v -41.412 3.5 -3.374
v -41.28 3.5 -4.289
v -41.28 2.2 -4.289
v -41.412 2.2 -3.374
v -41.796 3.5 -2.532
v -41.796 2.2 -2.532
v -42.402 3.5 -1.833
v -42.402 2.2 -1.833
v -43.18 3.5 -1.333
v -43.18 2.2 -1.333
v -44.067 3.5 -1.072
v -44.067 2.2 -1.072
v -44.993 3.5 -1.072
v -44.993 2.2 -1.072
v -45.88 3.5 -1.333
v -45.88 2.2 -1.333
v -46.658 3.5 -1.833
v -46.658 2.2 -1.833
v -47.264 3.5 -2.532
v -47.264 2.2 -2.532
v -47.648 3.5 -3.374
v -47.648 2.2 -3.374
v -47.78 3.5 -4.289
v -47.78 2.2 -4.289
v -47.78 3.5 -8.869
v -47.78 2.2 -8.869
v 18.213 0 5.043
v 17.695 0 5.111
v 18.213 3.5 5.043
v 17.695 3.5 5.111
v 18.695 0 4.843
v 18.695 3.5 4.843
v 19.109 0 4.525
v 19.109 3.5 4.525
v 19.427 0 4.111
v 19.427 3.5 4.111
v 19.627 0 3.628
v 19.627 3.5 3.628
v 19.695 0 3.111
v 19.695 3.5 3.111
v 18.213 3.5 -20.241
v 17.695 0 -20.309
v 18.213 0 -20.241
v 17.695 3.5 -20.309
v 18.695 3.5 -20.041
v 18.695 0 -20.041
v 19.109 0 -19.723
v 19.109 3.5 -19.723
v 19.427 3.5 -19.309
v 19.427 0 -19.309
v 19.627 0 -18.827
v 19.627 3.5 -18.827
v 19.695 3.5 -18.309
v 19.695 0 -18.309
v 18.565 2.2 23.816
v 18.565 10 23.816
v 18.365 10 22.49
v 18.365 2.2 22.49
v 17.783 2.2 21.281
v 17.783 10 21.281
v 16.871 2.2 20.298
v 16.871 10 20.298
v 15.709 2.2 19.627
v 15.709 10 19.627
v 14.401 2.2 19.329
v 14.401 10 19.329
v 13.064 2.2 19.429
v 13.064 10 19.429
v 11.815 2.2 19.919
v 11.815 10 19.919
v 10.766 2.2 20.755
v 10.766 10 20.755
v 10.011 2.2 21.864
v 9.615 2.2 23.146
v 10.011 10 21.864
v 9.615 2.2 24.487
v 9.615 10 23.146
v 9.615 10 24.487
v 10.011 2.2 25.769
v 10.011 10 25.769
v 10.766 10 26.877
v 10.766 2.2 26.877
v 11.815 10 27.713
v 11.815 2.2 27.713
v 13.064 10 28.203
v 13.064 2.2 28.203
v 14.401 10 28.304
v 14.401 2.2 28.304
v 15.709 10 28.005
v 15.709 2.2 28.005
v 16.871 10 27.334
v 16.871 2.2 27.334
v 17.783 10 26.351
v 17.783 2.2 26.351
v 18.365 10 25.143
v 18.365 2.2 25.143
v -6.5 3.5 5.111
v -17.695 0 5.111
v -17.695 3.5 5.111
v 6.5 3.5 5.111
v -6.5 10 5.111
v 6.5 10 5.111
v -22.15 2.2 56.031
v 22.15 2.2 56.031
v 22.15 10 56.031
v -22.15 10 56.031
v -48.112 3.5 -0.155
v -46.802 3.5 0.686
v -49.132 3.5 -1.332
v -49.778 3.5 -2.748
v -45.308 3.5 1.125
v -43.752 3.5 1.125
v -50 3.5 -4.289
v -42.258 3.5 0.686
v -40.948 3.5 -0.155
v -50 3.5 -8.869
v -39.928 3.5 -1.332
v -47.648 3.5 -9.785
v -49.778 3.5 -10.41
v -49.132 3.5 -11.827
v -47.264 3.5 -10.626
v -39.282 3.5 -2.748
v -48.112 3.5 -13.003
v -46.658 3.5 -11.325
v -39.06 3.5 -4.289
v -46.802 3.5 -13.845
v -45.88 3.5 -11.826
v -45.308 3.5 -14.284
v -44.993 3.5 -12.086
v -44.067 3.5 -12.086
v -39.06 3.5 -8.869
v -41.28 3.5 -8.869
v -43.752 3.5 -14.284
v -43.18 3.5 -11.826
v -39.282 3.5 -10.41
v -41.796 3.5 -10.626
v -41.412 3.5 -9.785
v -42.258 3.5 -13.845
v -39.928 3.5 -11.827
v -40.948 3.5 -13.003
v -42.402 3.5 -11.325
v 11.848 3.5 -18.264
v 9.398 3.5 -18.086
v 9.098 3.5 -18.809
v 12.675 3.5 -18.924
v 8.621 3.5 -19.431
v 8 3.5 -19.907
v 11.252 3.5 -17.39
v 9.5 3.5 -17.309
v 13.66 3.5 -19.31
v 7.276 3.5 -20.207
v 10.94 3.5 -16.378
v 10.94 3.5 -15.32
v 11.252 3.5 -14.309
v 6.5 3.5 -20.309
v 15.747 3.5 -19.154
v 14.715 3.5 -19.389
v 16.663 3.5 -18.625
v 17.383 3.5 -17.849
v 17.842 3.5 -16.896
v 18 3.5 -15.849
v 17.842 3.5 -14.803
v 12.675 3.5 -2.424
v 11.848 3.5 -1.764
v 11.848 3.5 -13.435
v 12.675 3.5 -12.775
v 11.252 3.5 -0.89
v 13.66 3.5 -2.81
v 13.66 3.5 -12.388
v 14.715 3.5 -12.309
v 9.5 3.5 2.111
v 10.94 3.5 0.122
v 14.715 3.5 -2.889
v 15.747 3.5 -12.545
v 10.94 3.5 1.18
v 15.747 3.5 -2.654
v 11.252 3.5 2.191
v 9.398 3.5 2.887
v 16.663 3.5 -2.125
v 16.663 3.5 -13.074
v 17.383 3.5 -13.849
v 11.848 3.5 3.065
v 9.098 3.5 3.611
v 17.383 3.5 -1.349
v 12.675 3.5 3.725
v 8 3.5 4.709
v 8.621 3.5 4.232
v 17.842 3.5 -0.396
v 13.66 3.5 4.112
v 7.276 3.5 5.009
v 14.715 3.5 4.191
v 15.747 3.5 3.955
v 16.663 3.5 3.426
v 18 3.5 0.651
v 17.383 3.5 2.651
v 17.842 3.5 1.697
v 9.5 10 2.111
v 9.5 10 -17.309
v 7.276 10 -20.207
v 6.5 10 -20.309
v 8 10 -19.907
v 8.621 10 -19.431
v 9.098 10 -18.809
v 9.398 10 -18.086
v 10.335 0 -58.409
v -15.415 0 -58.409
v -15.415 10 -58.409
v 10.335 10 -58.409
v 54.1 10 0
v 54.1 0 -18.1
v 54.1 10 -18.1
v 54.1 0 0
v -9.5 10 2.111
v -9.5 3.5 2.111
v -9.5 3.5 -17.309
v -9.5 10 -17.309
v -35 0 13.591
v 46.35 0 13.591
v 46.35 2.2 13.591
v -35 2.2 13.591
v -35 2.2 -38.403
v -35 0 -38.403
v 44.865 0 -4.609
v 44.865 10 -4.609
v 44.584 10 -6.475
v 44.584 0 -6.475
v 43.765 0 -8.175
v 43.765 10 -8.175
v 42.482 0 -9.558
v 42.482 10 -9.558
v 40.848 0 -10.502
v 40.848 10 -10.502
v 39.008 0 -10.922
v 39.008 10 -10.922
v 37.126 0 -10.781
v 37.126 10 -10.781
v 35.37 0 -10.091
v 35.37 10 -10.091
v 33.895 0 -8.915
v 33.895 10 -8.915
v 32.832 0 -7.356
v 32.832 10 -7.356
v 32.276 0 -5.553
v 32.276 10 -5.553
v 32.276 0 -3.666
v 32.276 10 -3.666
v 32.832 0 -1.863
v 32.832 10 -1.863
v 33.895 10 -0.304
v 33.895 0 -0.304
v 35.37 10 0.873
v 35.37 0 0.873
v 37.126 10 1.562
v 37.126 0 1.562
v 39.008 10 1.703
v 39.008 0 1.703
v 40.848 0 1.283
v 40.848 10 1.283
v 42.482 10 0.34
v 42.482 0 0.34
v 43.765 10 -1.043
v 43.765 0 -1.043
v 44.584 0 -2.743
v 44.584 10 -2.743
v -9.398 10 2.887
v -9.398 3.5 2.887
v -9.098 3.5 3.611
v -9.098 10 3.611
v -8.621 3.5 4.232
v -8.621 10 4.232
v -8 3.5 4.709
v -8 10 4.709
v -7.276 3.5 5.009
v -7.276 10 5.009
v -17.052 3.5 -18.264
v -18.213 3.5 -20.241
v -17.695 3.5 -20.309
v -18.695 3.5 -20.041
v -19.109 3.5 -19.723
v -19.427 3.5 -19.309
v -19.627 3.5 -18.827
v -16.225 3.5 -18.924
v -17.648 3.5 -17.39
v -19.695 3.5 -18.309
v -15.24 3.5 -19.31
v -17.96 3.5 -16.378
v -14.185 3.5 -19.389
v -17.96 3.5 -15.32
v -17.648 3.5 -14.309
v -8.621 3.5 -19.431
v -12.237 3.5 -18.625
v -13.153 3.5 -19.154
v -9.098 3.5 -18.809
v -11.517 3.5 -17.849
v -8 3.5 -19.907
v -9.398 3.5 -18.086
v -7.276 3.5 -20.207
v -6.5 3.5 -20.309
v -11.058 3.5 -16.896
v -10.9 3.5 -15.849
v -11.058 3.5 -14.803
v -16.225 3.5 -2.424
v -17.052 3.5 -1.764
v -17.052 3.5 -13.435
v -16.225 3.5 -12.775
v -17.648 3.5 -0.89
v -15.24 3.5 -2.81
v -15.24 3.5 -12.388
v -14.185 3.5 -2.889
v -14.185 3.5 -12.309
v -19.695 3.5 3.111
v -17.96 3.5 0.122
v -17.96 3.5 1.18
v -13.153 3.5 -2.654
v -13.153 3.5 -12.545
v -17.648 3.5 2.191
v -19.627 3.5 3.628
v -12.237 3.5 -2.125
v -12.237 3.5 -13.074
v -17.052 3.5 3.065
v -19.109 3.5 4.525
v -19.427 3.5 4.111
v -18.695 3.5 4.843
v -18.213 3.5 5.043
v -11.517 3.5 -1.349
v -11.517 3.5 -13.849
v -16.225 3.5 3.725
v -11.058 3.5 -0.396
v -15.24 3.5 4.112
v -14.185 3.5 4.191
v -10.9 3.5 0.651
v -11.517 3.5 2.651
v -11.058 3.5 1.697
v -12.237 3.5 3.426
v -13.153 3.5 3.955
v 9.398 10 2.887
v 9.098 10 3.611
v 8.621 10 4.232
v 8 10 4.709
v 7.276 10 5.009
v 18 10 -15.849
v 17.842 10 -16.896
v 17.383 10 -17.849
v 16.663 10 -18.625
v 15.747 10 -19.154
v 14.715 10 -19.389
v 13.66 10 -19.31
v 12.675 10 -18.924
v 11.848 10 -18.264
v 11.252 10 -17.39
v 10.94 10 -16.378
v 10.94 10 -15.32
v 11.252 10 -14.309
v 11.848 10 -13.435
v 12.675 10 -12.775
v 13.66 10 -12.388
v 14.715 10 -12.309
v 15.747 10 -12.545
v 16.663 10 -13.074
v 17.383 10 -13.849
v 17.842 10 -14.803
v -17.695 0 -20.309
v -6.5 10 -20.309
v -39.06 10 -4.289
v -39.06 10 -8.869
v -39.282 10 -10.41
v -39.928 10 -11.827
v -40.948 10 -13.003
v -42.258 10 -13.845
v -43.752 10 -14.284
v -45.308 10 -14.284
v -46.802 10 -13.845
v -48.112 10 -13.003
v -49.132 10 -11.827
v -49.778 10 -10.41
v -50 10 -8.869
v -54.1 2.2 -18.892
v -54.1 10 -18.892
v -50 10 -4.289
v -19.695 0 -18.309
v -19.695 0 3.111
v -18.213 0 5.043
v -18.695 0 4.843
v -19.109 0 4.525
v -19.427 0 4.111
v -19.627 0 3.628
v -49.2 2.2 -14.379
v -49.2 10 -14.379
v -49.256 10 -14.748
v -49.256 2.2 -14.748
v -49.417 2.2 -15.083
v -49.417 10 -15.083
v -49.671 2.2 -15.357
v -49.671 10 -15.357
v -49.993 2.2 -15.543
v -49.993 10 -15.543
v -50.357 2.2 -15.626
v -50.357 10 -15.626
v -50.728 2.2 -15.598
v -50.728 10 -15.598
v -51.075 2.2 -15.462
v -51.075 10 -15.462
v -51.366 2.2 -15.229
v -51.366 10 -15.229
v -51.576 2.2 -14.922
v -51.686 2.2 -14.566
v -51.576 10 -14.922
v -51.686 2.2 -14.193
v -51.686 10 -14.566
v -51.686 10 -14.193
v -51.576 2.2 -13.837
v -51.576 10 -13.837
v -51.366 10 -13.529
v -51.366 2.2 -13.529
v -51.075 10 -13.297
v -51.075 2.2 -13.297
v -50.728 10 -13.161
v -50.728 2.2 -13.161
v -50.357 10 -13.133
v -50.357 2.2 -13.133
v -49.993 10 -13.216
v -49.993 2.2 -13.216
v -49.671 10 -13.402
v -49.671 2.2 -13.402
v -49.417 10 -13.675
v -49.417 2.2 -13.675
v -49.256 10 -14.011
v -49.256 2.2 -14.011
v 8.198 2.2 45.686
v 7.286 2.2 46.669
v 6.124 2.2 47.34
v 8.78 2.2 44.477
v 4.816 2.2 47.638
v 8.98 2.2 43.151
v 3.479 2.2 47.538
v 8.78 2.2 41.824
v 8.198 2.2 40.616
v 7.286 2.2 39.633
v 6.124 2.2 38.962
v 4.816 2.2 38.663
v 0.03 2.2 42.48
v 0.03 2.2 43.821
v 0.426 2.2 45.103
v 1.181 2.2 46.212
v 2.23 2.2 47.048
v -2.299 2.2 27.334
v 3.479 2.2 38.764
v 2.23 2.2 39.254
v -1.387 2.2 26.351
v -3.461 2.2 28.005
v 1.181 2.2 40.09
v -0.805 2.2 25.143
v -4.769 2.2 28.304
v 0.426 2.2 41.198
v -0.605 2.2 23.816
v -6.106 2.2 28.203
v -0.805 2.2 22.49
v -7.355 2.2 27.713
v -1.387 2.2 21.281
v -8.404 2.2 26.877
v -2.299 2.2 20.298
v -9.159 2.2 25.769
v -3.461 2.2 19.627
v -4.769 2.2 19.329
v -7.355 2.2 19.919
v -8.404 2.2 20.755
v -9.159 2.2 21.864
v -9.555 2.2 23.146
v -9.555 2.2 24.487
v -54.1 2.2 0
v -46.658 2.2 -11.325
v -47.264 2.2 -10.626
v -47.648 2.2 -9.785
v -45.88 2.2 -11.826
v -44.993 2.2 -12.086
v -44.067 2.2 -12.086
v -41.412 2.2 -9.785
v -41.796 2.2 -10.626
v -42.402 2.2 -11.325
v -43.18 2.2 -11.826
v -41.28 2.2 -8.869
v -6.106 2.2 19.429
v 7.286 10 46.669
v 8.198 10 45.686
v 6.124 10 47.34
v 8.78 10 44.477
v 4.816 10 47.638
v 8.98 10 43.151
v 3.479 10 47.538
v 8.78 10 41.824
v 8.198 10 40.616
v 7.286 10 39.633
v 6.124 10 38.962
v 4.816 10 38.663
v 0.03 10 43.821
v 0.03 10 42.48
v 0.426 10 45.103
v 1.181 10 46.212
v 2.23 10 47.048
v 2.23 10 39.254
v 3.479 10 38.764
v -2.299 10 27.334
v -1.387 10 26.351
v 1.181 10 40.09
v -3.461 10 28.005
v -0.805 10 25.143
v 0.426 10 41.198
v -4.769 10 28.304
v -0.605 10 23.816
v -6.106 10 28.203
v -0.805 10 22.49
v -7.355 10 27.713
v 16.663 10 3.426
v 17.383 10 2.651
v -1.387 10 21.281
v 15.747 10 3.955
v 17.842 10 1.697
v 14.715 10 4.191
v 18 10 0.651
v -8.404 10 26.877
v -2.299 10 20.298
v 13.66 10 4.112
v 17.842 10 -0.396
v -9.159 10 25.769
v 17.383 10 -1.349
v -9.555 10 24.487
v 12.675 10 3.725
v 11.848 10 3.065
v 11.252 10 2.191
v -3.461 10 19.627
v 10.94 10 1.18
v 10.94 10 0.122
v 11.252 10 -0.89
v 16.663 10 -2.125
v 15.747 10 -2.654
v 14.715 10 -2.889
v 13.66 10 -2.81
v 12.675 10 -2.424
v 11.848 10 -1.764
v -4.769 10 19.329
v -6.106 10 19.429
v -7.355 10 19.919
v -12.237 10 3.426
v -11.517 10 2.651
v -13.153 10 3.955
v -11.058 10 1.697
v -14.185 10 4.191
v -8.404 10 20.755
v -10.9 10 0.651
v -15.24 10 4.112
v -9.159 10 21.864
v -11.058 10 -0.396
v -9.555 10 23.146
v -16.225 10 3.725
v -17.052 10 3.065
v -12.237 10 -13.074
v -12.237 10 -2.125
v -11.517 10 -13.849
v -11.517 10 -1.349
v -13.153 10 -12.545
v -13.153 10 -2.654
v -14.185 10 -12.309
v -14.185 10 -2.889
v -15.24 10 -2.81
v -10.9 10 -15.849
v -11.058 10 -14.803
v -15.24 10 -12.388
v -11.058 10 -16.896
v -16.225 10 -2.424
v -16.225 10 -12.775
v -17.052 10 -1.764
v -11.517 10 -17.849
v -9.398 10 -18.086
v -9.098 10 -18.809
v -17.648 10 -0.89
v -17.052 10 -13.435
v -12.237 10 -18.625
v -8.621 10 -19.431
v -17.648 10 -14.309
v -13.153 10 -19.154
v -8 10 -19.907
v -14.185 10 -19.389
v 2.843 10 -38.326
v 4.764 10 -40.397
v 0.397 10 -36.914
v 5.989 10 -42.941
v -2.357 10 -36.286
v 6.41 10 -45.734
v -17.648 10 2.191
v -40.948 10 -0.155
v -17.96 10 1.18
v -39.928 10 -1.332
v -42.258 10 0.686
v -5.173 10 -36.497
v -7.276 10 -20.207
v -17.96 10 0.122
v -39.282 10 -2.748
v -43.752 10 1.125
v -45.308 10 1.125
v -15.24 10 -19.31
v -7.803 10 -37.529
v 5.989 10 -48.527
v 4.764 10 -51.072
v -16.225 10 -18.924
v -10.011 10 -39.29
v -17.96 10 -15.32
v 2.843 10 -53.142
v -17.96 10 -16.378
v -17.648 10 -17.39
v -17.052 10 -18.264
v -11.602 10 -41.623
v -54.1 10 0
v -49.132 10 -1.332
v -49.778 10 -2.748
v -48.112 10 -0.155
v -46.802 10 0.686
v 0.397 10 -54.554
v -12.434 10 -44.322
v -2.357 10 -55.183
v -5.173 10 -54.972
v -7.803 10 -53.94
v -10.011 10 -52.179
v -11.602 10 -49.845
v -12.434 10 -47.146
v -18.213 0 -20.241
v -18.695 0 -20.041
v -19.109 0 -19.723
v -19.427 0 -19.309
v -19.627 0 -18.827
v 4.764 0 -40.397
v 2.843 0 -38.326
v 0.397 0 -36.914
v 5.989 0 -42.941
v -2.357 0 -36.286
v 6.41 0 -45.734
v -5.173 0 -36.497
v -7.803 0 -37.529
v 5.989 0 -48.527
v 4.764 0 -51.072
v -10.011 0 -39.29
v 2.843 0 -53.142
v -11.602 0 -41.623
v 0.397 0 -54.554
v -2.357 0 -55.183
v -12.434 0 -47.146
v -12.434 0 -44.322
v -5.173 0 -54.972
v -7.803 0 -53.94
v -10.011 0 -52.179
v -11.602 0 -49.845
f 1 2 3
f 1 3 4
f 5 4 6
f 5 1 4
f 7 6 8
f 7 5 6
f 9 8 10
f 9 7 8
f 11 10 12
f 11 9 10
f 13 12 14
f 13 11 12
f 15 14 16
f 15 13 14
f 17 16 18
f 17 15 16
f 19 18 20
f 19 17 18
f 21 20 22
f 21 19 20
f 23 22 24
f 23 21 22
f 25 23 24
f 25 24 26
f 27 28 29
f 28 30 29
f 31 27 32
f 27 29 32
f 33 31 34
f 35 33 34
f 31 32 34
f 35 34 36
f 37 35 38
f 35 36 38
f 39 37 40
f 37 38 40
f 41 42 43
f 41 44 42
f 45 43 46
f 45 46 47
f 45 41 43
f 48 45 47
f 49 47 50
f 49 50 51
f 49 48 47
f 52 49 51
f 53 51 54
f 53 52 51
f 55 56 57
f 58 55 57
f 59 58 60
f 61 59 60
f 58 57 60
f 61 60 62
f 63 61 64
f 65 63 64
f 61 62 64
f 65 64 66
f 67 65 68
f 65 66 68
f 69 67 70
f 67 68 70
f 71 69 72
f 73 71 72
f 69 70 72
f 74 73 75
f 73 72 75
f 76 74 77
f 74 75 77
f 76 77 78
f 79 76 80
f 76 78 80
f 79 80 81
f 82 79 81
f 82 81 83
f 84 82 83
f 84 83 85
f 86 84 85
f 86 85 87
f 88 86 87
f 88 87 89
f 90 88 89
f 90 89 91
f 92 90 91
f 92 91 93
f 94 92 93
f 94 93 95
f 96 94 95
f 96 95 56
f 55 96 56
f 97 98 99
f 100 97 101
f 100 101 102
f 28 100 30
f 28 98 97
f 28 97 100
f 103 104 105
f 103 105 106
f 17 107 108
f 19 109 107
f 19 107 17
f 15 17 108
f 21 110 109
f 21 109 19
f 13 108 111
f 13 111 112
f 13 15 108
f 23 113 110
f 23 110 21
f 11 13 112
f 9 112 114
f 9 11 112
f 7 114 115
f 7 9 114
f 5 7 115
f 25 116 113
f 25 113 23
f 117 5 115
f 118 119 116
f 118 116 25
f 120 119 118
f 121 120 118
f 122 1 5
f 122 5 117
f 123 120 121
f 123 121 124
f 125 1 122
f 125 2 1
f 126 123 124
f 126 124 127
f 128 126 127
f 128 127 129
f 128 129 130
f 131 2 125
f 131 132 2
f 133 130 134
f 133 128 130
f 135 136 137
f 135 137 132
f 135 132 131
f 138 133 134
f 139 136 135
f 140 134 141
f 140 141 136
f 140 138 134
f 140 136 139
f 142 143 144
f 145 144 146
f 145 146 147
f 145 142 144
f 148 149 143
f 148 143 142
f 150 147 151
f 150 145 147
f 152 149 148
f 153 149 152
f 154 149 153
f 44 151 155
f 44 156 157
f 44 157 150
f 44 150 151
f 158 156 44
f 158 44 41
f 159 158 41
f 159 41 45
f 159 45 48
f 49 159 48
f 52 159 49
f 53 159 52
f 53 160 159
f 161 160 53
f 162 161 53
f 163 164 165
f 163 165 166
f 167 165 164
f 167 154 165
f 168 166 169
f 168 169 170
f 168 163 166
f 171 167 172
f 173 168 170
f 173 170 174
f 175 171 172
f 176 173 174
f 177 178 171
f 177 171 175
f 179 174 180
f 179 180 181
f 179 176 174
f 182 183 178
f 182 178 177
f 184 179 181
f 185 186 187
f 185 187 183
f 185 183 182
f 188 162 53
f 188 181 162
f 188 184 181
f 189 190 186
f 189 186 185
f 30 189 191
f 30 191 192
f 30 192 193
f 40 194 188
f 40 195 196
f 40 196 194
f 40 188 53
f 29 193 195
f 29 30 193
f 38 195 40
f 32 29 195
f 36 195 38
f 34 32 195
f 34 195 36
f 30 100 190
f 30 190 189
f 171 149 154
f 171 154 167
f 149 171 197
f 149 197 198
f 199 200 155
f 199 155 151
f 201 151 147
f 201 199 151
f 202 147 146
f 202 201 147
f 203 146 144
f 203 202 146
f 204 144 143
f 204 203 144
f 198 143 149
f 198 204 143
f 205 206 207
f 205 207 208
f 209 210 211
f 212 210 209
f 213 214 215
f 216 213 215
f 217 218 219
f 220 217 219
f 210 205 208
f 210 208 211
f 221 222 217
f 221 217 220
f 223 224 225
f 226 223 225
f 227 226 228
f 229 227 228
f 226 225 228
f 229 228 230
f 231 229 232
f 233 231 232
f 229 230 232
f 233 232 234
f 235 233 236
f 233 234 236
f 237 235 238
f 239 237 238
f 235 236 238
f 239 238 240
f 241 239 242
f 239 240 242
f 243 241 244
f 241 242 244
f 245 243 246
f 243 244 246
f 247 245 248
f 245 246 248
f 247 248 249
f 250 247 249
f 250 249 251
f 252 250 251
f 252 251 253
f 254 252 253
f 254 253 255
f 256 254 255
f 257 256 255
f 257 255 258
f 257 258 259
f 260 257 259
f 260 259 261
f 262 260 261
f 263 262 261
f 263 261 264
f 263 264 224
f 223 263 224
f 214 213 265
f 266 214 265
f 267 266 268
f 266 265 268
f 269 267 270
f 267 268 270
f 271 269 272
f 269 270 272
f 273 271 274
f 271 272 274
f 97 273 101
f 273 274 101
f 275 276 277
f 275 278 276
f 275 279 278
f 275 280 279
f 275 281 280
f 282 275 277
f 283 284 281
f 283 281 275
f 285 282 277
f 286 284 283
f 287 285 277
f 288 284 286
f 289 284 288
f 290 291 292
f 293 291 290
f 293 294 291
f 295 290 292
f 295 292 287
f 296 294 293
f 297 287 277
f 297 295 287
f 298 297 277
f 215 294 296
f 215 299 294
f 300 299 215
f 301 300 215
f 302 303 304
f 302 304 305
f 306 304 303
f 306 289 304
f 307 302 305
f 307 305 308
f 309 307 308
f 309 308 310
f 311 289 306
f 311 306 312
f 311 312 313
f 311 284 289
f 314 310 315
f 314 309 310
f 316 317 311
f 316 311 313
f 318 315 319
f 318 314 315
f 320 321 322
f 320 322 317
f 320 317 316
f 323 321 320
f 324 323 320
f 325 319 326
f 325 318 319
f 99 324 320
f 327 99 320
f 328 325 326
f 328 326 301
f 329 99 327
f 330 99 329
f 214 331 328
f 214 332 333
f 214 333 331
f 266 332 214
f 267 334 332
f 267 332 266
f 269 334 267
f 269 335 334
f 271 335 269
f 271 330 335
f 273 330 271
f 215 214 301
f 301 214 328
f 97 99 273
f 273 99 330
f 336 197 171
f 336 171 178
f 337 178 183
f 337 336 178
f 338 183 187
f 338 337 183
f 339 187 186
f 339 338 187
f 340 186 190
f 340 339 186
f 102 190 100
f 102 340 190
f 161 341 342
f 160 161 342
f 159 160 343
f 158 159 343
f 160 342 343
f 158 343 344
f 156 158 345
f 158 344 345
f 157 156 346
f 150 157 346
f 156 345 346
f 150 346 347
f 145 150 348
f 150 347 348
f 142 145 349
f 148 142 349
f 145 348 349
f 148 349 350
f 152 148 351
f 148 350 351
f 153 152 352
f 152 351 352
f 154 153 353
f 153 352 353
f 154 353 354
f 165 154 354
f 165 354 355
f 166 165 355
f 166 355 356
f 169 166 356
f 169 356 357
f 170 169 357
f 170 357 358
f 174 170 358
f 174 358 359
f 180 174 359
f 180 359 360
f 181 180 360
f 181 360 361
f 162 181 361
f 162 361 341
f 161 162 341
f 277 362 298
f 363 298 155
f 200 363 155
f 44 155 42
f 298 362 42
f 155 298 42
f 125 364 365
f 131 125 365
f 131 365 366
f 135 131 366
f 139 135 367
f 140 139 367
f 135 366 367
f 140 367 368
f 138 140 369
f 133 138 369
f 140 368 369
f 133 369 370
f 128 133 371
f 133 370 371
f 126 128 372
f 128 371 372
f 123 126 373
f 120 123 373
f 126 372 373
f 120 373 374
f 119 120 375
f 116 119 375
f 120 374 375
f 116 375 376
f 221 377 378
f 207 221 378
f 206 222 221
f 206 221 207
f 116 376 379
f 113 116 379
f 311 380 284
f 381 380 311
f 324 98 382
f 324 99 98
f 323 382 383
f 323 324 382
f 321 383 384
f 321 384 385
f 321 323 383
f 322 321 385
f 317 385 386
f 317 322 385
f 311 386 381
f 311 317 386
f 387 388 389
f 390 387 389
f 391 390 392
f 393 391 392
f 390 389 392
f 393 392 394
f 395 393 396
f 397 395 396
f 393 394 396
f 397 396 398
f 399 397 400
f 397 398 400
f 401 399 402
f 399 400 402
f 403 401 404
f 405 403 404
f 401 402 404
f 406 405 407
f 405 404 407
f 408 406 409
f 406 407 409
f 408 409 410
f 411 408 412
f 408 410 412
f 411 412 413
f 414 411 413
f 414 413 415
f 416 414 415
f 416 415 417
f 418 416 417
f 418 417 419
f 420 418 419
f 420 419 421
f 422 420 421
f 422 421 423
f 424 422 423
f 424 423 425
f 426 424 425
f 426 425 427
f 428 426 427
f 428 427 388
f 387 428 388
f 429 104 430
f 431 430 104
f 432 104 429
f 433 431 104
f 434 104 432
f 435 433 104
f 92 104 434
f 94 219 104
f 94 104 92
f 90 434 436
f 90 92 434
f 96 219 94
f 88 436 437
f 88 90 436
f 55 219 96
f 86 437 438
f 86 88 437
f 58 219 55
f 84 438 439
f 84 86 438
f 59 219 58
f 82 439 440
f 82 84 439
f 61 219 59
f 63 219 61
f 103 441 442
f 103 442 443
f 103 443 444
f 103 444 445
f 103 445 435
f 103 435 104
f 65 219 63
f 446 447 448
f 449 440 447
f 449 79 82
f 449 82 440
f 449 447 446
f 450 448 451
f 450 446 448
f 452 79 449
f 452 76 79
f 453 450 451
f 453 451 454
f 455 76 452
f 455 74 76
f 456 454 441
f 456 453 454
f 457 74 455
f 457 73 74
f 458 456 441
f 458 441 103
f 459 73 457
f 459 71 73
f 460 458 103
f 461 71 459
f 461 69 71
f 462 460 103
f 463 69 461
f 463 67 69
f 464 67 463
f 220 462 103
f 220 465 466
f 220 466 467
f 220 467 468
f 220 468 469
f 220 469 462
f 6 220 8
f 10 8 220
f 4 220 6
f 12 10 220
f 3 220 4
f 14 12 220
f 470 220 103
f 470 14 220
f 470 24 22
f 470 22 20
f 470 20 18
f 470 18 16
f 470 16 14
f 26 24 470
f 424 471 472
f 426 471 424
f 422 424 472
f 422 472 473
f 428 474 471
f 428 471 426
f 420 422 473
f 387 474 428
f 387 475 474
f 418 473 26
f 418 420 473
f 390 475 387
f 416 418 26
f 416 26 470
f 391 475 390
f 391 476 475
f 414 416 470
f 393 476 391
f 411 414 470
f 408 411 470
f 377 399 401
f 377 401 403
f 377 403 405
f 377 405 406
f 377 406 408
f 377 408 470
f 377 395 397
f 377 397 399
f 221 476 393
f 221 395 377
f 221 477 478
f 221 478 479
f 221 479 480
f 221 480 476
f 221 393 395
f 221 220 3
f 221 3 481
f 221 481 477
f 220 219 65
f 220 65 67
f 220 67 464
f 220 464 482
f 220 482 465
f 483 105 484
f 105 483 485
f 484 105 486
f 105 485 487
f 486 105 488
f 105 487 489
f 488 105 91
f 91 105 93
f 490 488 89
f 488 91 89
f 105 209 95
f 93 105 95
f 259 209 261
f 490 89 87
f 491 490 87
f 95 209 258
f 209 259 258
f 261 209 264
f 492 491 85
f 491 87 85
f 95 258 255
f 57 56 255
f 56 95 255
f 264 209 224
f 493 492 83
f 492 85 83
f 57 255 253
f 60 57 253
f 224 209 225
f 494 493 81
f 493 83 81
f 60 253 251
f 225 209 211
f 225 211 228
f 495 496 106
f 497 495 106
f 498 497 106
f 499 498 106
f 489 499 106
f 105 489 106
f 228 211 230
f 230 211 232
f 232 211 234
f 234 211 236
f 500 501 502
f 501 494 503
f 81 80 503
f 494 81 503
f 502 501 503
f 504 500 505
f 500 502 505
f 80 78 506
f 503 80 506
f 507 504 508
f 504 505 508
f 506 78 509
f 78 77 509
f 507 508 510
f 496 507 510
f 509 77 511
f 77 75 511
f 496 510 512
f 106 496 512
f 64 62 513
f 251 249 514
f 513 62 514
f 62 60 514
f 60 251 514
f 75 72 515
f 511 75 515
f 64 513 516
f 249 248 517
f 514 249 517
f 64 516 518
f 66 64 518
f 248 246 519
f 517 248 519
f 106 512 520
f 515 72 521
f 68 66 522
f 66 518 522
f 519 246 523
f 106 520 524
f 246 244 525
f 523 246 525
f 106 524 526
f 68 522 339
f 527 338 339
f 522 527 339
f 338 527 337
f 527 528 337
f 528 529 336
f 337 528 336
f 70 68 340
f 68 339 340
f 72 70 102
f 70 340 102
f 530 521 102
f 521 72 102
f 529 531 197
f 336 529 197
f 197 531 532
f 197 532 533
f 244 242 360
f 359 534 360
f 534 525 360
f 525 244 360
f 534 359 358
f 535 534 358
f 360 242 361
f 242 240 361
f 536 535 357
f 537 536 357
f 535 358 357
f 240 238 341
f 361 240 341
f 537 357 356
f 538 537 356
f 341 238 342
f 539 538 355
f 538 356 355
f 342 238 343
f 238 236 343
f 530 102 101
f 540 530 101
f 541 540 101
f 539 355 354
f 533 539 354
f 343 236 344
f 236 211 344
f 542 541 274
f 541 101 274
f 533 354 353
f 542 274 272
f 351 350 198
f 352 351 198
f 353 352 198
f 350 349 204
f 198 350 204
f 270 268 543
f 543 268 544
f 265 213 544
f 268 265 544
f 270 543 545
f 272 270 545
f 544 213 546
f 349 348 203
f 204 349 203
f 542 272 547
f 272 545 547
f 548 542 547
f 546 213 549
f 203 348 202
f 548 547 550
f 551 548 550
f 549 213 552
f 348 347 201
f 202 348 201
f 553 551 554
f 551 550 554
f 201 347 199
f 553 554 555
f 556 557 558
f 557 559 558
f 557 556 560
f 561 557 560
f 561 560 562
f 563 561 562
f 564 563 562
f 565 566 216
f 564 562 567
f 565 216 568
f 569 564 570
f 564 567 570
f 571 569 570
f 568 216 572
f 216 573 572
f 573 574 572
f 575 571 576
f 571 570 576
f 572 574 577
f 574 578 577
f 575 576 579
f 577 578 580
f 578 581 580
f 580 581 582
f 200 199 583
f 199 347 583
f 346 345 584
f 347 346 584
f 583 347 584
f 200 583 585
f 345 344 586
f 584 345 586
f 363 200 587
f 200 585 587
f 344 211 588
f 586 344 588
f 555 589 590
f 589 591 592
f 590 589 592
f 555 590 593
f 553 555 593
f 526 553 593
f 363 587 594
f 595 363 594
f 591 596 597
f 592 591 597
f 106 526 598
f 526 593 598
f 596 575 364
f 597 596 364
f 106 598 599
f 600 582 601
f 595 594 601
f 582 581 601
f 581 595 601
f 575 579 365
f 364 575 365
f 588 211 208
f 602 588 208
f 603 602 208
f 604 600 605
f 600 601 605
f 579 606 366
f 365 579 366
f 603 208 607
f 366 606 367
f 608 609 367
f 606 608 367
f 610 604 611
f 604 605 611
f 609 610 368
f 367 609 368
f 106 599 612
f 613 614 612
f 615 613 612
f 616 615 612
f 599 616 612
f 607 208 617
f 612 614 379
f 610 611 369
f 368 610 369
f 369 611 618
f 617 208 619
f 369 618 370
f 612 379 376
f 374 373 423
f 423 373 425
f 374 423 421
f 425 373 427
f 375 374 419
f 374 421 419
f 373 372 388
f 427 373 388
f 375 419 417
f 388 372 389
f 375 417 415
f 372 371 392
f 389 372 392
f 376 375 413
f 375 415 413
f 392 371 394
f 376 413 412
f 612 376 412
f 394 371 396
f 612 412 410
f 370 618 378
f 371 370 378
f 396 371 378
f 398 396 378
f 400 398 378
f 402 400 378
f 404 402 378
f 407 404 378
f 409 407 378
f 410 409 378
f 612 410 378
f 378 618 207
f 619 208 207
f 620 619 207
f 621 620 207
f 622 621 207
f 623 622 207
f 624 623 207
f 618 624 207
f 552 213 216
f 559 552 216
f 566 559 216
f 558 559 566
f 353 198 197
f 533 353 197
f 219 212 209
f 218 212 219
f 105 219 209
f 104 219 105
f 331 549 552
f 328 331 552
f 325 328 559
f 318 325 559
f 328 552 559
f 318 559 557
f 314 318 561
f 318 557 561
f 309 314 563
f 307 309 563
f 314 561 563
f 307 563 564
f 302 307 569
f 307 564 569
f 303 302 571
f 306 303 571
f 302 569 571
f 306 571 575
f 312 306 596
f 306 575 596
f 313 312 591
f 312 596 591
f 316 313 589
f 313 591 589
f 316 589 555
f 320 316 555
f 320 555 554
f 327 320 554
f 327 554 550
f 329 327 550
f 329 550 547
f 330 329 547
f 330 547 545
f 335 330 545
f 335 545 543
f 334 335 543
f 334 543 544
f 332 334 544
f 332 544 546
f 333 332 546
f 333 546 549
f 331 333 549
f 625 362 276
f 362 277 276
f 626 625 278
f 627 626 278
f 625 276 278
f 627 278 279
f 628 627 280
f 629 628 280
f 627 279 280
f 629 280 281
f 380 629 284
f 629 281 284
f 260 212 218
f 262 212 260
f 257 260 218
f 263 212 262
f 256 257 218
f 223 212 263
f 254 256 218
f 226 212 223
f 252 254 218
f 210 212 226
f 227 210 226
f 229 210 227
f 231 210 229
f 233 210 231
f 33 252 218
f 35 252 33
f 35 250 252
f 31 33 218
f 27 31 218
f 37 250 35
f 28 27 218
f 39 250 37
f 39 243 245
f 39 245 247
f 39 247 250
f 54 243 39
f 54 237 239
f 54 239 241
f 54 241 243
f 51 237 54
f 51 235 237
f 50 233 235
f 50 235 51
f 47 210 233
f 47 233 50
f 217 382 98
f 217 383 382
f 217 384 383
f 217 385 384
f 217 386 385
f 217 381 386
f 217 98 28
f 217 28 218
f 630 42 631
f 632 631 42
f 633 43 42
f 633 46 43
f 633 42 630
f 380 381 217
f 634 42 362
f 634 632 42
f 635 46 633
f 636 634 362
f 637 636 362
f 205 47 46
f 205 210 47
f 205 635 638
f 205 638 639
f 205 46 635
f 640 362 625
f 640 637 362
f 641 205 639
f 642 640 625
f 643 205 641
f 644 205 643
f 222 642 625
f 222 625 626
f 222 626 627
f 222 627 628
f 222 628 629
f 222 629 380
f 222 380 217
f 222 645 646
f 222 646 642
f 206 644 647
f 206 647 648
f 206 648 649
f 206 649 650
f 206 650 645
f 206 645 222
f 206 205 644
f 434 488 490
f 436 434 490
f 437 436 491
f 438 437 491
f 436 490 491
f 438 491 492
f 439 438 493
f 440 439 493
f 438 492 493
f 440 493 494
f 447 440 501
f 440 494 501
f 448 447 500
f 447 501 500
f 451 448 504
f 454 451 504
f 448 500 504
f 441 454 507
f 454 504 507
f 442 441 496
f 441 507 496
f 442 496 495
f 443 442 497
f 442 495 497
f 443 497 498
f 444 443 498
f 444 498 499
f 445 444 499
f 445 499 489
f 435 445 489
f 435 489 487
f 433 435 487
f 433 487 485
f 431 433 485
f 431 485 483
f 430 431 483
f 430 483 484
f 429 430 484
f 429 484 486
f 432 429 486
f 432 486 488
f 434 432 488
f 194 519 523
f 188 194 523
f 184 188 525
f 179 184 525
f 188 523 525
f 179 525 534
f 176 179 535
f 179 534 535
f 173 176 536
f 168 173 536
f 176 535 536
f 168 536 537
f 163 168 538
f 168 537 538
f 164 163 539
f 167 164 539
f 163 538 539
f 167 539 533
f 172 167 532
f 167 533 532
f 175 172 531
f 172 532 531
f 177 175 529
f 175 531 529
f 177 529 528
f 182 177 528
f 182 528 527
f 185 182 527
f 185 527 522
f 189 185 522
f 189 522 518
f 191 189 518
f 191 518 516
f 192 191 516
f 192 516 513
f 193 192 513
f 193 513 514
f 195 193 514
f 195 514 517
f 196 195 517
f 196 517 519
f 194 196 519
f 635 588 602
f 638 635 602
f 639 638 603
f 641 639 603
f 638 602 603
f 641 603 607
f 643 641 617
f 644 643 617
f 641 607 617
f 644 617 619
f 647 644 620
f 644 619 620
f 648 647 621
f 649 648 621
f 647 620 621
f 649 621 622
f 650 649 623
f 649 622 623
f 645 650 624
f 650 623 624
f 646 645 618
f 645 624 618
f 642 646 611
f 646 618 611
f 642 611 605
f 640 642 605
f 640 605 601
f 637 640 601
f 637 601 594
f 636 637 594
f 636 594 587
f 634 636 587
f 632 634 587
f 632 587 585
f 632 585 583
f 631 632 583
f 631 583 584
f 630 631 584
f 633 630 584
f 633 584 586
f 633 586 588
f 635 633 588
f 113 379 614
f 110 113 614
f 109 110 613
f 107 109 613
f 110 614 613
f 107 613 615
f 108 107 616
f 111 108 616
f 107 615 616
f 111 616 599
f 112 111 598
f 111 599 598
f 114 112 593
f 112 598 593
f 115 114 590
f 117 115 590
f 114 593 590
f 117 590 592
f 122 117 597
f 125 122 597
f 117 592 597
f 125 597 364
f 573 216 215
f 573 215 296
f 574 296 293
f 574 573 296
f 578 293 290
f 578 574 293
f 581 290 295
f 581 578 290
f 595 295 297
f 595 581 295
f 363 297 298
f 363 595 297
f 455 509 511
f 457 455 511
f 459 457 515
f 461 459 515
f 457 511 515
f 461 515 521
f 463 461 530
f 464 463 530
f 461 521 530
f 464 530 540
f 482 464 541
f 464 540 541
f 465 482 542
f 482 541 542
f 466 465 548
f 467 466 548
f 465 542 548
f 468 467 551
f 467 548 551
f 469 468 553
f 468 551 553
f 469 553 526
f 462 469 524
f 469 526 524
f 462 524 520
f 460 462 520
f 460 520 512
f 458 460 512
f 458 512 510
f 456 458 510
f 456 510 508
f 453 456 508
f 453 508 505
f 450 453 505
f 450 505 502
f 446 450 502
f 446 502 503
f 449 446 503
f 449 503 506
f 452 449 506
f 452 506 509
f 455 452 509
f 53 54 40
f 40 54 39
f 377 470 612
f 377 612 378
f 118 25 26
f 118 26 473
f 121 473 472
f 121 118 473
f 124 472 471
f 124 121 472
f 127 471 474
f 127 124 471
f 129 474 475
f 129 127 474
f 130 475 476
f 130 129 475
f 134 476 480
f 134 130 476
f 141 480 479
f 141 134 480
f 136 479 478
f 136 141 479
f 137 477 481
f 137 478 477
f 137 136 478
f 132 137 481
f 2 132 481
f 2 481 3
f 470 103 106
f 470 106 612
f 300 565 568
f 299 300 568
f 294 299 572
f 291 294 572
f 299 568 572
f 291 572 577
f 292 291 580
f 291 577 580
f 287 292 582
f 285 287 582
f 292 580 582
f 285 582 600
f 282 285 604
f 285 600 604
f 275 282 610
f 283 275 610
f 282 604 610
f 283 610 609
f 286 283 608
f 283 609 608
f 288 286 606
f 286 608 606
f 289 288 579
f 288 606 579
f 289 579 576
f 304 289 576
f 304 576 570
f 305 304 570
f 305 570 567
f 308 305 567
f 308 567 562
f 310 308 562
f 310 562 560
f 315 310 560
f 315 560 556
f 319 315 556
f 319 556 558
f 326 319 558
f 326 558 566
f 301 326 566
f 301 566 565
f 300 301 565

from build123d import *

# Parameters (mm, degrees)
SKETCH1_W           = 19
SKETCH1_H           = 25.42
BOSS_EXTRUDE2_DEPTH = 10
FILLET1_R           = 3
SKETCH3_W           = 19.1
SKETCH3_H           = 2.2
CUT_EXTRUDE2_DEPTH  = 127.977650002
SKETCH4_R           = 6.33
SKETCH4_R_2         = 3.55
SKETCH4_R_3         = 4.5
SKETCH4_R_4         = 9.475
SKETCH4_R_5         = 1.25
CUT_EXTRUDE3_DEPTH  = 81.239939075
SKETCH5_W           = 42.44
SKETCH5_H           = 2.2
CUT_EXTRUDE4_DEPTH  = 108.006765313
SKETCH6_W           = 39.39
SKETCH6_H           = 25.42
CUT_EXTRUDE5_DEPTH  = 3.5
FILLET2_R           = 2
CUT_EXTRUDE6_DEPTH  = 6.5
CUT_EXTRUDE7_DEPTH  = 80.879270294


with BuildPart() as part:
    # Sketch1 → Boss-Extrude2 (new body)
    with BuildSketch(Plane(origin=(0, 0, 0), x_dir=(1, 0, 0), z_dir=(0, 1, 0))):
        Polygon((54.1, 18.1), (54.1, 0), (22.15, -56.030772795), (-22.15, -56.030772795), (-54.1, 0), (-54.1, 18.89218031), (-15.415468147, 58.409227205), (10.334531853, 58.409227205), align=None)
        with Locations((0, 7.599227205)):
            Rectangle(SKETCH1_W, SKETCH1_H, mode=Mode.SUBTRACT)
    extrude(amount=BOSS_EXTRUDE2_DEPTH)

    # Fillet1
    fillet1_edges = [part.edges().sort_by_distance(p)[0] for p in [
        (-9.5, 5, 5.110772795),
        (9.5, 5, 5.110772795),
        (9.5, 5, -20.309227205),
        (-9.5, 5, -20.309227205),
    ]]
    fillet(fillet1_edges, radius=FILLET1_R)

    # Sketch3 → Cut-Extrude2 (cut, through all)
    with BuildSketch(Plane(origin=(0, 0, -58.409227205), x_dir=(-1, 0, 0), z_dir=(0, 0, -1))):
        with Locations((44.55, 1.1)):
            Rectangle(SKETCH3_W, SKETCH3_H)
    extrude(amount=-CUT_EXTRUDE2_DEPTH, mode=Mode.SUBTRACT)

    # Sketch4 → Cut-Extrude3 (cut, through all)
    with BuildSketch(Plane(origin=(0, 10, 0), x_dir=(1, 0, 0), z_dir=(0, 1, 0))):
        with Locations((38.535, 4.609227205)):
            Circle(SKETCH4_R)
        with Locations((-14.45, -0.650772795)):
            Circle(SKETCH4_R_2)
        with Locations((-14.45, 15.849227205)):
            Circle(SKETCH4_R_2)
        with Locations((14.45, -0.650772795)):
            Circle(SKETCH4_R_2)
        with Locations((14.45, 15.849227205)):
            Circle(SKETCH4_R_2)
        with Locations((-5.105, -23.816239571)):
            Circle(SKETCH4_R_3)
        with Locations((14.065, -23.816239571)):
            Circle(SKETCH4_R_3)
        with Locations((4.48, -43.150772795)):
            Circle(SKETCH4_R_3)
        with Locations((-3.065, 45.734227205)):
            Circle(SKETCH4_R_4)
        with Locations((-50.45, 14.379227205)):
            Circle(SKETCH4_R_5)
    extrude(amount=-CUT_EXTRUDE3_DEPTH, mode=Mode.SUBTRACT)

    # Sketch5 → Cut-Extrude4 (cut, through all)
    with BuildSketch(Plane.ZY.offset(35)):
        with Locations((34.810772795, 1.1)):
            Rectangle(SKETCH5_W, SKETCH5_H)
    extrude(amount=-CUT_EXTRUDE4_DEPTH, mode=Mode.SUBTRACT)

    # Sketch6 → Cut-Extrude5 (cut)
    with BuildSketch(Plane.XZ):
        with Locations((0, -7.599227205)):
            Rectangle(SKETCH6_W, SKETCH6_H)
    extrude(amount=-CUT_EXTRUDE5_DEPTH, mode=Mode.SUBTRACT)

    # Fillet2
    fillet2_edges = [part.edges().sort_by_distance(p)[0] for p in [
        (19.695, 1.75, 5.110772795),
        (19.695, 1.75, -20.309227205),
        (-19.695, 1.75, 5.110772795),
        (-19.695, 1.75, -20.309227205),
    ]]
    fillet(fillet2_edges, radius=FILLET2_R)

    # Sketch4<3> → Cut-Extrude6 (cut)
    with BuildSketch(Plane(origin=(0, 10, 0), x_dir=(1, 0, 0), z_dir=(0, 1, 0))):
        with BuildLine():
            Line((-39.06, 4.289227205), (-39.06, 8.869227205))
            ThreePointArc((-39.06, 8.869227205), (-44.53, 14.339227205), (-50, 8.869227205))
            Line((-50, 8.869227205), (-50, 4.289227205))
            ThreePointArc((-50, 4.289227205), (-44.53, -1.180772795), (-39.06, 4.289227205))
        make_face()
    extrude(amount=-CUT_EXTRUDE6_DEPTH, mode=Mode.SUBTRACT)

    # Sketch7 → Cut-Extrude7 (cut, through all)
    with BuildSketch(Plane(origin=(0, 3.5, 0), x_dir=(-1, 0, 0), z_dir=(0, 1, 0))):
        with BuildLine():
            Line((41.28, -8.869227205), (41.28, -4.289227205))
            ThreePointArc((41.28, -4.289227205), (44.53, -1.039227205), (47.78, -4.289227205))
            Line((47.78, -4.289227205), (47.78, -8.869227205))
            ThreePointArc((47.78, -8.869227205), (44.53, -12.119227205), (41.28, -8.869227205))
        make_face()
    extrude(amount=-CUT_EXTRUDE7_DEPTH, mode=Mode.SUBTRACT)


solid = part.part
